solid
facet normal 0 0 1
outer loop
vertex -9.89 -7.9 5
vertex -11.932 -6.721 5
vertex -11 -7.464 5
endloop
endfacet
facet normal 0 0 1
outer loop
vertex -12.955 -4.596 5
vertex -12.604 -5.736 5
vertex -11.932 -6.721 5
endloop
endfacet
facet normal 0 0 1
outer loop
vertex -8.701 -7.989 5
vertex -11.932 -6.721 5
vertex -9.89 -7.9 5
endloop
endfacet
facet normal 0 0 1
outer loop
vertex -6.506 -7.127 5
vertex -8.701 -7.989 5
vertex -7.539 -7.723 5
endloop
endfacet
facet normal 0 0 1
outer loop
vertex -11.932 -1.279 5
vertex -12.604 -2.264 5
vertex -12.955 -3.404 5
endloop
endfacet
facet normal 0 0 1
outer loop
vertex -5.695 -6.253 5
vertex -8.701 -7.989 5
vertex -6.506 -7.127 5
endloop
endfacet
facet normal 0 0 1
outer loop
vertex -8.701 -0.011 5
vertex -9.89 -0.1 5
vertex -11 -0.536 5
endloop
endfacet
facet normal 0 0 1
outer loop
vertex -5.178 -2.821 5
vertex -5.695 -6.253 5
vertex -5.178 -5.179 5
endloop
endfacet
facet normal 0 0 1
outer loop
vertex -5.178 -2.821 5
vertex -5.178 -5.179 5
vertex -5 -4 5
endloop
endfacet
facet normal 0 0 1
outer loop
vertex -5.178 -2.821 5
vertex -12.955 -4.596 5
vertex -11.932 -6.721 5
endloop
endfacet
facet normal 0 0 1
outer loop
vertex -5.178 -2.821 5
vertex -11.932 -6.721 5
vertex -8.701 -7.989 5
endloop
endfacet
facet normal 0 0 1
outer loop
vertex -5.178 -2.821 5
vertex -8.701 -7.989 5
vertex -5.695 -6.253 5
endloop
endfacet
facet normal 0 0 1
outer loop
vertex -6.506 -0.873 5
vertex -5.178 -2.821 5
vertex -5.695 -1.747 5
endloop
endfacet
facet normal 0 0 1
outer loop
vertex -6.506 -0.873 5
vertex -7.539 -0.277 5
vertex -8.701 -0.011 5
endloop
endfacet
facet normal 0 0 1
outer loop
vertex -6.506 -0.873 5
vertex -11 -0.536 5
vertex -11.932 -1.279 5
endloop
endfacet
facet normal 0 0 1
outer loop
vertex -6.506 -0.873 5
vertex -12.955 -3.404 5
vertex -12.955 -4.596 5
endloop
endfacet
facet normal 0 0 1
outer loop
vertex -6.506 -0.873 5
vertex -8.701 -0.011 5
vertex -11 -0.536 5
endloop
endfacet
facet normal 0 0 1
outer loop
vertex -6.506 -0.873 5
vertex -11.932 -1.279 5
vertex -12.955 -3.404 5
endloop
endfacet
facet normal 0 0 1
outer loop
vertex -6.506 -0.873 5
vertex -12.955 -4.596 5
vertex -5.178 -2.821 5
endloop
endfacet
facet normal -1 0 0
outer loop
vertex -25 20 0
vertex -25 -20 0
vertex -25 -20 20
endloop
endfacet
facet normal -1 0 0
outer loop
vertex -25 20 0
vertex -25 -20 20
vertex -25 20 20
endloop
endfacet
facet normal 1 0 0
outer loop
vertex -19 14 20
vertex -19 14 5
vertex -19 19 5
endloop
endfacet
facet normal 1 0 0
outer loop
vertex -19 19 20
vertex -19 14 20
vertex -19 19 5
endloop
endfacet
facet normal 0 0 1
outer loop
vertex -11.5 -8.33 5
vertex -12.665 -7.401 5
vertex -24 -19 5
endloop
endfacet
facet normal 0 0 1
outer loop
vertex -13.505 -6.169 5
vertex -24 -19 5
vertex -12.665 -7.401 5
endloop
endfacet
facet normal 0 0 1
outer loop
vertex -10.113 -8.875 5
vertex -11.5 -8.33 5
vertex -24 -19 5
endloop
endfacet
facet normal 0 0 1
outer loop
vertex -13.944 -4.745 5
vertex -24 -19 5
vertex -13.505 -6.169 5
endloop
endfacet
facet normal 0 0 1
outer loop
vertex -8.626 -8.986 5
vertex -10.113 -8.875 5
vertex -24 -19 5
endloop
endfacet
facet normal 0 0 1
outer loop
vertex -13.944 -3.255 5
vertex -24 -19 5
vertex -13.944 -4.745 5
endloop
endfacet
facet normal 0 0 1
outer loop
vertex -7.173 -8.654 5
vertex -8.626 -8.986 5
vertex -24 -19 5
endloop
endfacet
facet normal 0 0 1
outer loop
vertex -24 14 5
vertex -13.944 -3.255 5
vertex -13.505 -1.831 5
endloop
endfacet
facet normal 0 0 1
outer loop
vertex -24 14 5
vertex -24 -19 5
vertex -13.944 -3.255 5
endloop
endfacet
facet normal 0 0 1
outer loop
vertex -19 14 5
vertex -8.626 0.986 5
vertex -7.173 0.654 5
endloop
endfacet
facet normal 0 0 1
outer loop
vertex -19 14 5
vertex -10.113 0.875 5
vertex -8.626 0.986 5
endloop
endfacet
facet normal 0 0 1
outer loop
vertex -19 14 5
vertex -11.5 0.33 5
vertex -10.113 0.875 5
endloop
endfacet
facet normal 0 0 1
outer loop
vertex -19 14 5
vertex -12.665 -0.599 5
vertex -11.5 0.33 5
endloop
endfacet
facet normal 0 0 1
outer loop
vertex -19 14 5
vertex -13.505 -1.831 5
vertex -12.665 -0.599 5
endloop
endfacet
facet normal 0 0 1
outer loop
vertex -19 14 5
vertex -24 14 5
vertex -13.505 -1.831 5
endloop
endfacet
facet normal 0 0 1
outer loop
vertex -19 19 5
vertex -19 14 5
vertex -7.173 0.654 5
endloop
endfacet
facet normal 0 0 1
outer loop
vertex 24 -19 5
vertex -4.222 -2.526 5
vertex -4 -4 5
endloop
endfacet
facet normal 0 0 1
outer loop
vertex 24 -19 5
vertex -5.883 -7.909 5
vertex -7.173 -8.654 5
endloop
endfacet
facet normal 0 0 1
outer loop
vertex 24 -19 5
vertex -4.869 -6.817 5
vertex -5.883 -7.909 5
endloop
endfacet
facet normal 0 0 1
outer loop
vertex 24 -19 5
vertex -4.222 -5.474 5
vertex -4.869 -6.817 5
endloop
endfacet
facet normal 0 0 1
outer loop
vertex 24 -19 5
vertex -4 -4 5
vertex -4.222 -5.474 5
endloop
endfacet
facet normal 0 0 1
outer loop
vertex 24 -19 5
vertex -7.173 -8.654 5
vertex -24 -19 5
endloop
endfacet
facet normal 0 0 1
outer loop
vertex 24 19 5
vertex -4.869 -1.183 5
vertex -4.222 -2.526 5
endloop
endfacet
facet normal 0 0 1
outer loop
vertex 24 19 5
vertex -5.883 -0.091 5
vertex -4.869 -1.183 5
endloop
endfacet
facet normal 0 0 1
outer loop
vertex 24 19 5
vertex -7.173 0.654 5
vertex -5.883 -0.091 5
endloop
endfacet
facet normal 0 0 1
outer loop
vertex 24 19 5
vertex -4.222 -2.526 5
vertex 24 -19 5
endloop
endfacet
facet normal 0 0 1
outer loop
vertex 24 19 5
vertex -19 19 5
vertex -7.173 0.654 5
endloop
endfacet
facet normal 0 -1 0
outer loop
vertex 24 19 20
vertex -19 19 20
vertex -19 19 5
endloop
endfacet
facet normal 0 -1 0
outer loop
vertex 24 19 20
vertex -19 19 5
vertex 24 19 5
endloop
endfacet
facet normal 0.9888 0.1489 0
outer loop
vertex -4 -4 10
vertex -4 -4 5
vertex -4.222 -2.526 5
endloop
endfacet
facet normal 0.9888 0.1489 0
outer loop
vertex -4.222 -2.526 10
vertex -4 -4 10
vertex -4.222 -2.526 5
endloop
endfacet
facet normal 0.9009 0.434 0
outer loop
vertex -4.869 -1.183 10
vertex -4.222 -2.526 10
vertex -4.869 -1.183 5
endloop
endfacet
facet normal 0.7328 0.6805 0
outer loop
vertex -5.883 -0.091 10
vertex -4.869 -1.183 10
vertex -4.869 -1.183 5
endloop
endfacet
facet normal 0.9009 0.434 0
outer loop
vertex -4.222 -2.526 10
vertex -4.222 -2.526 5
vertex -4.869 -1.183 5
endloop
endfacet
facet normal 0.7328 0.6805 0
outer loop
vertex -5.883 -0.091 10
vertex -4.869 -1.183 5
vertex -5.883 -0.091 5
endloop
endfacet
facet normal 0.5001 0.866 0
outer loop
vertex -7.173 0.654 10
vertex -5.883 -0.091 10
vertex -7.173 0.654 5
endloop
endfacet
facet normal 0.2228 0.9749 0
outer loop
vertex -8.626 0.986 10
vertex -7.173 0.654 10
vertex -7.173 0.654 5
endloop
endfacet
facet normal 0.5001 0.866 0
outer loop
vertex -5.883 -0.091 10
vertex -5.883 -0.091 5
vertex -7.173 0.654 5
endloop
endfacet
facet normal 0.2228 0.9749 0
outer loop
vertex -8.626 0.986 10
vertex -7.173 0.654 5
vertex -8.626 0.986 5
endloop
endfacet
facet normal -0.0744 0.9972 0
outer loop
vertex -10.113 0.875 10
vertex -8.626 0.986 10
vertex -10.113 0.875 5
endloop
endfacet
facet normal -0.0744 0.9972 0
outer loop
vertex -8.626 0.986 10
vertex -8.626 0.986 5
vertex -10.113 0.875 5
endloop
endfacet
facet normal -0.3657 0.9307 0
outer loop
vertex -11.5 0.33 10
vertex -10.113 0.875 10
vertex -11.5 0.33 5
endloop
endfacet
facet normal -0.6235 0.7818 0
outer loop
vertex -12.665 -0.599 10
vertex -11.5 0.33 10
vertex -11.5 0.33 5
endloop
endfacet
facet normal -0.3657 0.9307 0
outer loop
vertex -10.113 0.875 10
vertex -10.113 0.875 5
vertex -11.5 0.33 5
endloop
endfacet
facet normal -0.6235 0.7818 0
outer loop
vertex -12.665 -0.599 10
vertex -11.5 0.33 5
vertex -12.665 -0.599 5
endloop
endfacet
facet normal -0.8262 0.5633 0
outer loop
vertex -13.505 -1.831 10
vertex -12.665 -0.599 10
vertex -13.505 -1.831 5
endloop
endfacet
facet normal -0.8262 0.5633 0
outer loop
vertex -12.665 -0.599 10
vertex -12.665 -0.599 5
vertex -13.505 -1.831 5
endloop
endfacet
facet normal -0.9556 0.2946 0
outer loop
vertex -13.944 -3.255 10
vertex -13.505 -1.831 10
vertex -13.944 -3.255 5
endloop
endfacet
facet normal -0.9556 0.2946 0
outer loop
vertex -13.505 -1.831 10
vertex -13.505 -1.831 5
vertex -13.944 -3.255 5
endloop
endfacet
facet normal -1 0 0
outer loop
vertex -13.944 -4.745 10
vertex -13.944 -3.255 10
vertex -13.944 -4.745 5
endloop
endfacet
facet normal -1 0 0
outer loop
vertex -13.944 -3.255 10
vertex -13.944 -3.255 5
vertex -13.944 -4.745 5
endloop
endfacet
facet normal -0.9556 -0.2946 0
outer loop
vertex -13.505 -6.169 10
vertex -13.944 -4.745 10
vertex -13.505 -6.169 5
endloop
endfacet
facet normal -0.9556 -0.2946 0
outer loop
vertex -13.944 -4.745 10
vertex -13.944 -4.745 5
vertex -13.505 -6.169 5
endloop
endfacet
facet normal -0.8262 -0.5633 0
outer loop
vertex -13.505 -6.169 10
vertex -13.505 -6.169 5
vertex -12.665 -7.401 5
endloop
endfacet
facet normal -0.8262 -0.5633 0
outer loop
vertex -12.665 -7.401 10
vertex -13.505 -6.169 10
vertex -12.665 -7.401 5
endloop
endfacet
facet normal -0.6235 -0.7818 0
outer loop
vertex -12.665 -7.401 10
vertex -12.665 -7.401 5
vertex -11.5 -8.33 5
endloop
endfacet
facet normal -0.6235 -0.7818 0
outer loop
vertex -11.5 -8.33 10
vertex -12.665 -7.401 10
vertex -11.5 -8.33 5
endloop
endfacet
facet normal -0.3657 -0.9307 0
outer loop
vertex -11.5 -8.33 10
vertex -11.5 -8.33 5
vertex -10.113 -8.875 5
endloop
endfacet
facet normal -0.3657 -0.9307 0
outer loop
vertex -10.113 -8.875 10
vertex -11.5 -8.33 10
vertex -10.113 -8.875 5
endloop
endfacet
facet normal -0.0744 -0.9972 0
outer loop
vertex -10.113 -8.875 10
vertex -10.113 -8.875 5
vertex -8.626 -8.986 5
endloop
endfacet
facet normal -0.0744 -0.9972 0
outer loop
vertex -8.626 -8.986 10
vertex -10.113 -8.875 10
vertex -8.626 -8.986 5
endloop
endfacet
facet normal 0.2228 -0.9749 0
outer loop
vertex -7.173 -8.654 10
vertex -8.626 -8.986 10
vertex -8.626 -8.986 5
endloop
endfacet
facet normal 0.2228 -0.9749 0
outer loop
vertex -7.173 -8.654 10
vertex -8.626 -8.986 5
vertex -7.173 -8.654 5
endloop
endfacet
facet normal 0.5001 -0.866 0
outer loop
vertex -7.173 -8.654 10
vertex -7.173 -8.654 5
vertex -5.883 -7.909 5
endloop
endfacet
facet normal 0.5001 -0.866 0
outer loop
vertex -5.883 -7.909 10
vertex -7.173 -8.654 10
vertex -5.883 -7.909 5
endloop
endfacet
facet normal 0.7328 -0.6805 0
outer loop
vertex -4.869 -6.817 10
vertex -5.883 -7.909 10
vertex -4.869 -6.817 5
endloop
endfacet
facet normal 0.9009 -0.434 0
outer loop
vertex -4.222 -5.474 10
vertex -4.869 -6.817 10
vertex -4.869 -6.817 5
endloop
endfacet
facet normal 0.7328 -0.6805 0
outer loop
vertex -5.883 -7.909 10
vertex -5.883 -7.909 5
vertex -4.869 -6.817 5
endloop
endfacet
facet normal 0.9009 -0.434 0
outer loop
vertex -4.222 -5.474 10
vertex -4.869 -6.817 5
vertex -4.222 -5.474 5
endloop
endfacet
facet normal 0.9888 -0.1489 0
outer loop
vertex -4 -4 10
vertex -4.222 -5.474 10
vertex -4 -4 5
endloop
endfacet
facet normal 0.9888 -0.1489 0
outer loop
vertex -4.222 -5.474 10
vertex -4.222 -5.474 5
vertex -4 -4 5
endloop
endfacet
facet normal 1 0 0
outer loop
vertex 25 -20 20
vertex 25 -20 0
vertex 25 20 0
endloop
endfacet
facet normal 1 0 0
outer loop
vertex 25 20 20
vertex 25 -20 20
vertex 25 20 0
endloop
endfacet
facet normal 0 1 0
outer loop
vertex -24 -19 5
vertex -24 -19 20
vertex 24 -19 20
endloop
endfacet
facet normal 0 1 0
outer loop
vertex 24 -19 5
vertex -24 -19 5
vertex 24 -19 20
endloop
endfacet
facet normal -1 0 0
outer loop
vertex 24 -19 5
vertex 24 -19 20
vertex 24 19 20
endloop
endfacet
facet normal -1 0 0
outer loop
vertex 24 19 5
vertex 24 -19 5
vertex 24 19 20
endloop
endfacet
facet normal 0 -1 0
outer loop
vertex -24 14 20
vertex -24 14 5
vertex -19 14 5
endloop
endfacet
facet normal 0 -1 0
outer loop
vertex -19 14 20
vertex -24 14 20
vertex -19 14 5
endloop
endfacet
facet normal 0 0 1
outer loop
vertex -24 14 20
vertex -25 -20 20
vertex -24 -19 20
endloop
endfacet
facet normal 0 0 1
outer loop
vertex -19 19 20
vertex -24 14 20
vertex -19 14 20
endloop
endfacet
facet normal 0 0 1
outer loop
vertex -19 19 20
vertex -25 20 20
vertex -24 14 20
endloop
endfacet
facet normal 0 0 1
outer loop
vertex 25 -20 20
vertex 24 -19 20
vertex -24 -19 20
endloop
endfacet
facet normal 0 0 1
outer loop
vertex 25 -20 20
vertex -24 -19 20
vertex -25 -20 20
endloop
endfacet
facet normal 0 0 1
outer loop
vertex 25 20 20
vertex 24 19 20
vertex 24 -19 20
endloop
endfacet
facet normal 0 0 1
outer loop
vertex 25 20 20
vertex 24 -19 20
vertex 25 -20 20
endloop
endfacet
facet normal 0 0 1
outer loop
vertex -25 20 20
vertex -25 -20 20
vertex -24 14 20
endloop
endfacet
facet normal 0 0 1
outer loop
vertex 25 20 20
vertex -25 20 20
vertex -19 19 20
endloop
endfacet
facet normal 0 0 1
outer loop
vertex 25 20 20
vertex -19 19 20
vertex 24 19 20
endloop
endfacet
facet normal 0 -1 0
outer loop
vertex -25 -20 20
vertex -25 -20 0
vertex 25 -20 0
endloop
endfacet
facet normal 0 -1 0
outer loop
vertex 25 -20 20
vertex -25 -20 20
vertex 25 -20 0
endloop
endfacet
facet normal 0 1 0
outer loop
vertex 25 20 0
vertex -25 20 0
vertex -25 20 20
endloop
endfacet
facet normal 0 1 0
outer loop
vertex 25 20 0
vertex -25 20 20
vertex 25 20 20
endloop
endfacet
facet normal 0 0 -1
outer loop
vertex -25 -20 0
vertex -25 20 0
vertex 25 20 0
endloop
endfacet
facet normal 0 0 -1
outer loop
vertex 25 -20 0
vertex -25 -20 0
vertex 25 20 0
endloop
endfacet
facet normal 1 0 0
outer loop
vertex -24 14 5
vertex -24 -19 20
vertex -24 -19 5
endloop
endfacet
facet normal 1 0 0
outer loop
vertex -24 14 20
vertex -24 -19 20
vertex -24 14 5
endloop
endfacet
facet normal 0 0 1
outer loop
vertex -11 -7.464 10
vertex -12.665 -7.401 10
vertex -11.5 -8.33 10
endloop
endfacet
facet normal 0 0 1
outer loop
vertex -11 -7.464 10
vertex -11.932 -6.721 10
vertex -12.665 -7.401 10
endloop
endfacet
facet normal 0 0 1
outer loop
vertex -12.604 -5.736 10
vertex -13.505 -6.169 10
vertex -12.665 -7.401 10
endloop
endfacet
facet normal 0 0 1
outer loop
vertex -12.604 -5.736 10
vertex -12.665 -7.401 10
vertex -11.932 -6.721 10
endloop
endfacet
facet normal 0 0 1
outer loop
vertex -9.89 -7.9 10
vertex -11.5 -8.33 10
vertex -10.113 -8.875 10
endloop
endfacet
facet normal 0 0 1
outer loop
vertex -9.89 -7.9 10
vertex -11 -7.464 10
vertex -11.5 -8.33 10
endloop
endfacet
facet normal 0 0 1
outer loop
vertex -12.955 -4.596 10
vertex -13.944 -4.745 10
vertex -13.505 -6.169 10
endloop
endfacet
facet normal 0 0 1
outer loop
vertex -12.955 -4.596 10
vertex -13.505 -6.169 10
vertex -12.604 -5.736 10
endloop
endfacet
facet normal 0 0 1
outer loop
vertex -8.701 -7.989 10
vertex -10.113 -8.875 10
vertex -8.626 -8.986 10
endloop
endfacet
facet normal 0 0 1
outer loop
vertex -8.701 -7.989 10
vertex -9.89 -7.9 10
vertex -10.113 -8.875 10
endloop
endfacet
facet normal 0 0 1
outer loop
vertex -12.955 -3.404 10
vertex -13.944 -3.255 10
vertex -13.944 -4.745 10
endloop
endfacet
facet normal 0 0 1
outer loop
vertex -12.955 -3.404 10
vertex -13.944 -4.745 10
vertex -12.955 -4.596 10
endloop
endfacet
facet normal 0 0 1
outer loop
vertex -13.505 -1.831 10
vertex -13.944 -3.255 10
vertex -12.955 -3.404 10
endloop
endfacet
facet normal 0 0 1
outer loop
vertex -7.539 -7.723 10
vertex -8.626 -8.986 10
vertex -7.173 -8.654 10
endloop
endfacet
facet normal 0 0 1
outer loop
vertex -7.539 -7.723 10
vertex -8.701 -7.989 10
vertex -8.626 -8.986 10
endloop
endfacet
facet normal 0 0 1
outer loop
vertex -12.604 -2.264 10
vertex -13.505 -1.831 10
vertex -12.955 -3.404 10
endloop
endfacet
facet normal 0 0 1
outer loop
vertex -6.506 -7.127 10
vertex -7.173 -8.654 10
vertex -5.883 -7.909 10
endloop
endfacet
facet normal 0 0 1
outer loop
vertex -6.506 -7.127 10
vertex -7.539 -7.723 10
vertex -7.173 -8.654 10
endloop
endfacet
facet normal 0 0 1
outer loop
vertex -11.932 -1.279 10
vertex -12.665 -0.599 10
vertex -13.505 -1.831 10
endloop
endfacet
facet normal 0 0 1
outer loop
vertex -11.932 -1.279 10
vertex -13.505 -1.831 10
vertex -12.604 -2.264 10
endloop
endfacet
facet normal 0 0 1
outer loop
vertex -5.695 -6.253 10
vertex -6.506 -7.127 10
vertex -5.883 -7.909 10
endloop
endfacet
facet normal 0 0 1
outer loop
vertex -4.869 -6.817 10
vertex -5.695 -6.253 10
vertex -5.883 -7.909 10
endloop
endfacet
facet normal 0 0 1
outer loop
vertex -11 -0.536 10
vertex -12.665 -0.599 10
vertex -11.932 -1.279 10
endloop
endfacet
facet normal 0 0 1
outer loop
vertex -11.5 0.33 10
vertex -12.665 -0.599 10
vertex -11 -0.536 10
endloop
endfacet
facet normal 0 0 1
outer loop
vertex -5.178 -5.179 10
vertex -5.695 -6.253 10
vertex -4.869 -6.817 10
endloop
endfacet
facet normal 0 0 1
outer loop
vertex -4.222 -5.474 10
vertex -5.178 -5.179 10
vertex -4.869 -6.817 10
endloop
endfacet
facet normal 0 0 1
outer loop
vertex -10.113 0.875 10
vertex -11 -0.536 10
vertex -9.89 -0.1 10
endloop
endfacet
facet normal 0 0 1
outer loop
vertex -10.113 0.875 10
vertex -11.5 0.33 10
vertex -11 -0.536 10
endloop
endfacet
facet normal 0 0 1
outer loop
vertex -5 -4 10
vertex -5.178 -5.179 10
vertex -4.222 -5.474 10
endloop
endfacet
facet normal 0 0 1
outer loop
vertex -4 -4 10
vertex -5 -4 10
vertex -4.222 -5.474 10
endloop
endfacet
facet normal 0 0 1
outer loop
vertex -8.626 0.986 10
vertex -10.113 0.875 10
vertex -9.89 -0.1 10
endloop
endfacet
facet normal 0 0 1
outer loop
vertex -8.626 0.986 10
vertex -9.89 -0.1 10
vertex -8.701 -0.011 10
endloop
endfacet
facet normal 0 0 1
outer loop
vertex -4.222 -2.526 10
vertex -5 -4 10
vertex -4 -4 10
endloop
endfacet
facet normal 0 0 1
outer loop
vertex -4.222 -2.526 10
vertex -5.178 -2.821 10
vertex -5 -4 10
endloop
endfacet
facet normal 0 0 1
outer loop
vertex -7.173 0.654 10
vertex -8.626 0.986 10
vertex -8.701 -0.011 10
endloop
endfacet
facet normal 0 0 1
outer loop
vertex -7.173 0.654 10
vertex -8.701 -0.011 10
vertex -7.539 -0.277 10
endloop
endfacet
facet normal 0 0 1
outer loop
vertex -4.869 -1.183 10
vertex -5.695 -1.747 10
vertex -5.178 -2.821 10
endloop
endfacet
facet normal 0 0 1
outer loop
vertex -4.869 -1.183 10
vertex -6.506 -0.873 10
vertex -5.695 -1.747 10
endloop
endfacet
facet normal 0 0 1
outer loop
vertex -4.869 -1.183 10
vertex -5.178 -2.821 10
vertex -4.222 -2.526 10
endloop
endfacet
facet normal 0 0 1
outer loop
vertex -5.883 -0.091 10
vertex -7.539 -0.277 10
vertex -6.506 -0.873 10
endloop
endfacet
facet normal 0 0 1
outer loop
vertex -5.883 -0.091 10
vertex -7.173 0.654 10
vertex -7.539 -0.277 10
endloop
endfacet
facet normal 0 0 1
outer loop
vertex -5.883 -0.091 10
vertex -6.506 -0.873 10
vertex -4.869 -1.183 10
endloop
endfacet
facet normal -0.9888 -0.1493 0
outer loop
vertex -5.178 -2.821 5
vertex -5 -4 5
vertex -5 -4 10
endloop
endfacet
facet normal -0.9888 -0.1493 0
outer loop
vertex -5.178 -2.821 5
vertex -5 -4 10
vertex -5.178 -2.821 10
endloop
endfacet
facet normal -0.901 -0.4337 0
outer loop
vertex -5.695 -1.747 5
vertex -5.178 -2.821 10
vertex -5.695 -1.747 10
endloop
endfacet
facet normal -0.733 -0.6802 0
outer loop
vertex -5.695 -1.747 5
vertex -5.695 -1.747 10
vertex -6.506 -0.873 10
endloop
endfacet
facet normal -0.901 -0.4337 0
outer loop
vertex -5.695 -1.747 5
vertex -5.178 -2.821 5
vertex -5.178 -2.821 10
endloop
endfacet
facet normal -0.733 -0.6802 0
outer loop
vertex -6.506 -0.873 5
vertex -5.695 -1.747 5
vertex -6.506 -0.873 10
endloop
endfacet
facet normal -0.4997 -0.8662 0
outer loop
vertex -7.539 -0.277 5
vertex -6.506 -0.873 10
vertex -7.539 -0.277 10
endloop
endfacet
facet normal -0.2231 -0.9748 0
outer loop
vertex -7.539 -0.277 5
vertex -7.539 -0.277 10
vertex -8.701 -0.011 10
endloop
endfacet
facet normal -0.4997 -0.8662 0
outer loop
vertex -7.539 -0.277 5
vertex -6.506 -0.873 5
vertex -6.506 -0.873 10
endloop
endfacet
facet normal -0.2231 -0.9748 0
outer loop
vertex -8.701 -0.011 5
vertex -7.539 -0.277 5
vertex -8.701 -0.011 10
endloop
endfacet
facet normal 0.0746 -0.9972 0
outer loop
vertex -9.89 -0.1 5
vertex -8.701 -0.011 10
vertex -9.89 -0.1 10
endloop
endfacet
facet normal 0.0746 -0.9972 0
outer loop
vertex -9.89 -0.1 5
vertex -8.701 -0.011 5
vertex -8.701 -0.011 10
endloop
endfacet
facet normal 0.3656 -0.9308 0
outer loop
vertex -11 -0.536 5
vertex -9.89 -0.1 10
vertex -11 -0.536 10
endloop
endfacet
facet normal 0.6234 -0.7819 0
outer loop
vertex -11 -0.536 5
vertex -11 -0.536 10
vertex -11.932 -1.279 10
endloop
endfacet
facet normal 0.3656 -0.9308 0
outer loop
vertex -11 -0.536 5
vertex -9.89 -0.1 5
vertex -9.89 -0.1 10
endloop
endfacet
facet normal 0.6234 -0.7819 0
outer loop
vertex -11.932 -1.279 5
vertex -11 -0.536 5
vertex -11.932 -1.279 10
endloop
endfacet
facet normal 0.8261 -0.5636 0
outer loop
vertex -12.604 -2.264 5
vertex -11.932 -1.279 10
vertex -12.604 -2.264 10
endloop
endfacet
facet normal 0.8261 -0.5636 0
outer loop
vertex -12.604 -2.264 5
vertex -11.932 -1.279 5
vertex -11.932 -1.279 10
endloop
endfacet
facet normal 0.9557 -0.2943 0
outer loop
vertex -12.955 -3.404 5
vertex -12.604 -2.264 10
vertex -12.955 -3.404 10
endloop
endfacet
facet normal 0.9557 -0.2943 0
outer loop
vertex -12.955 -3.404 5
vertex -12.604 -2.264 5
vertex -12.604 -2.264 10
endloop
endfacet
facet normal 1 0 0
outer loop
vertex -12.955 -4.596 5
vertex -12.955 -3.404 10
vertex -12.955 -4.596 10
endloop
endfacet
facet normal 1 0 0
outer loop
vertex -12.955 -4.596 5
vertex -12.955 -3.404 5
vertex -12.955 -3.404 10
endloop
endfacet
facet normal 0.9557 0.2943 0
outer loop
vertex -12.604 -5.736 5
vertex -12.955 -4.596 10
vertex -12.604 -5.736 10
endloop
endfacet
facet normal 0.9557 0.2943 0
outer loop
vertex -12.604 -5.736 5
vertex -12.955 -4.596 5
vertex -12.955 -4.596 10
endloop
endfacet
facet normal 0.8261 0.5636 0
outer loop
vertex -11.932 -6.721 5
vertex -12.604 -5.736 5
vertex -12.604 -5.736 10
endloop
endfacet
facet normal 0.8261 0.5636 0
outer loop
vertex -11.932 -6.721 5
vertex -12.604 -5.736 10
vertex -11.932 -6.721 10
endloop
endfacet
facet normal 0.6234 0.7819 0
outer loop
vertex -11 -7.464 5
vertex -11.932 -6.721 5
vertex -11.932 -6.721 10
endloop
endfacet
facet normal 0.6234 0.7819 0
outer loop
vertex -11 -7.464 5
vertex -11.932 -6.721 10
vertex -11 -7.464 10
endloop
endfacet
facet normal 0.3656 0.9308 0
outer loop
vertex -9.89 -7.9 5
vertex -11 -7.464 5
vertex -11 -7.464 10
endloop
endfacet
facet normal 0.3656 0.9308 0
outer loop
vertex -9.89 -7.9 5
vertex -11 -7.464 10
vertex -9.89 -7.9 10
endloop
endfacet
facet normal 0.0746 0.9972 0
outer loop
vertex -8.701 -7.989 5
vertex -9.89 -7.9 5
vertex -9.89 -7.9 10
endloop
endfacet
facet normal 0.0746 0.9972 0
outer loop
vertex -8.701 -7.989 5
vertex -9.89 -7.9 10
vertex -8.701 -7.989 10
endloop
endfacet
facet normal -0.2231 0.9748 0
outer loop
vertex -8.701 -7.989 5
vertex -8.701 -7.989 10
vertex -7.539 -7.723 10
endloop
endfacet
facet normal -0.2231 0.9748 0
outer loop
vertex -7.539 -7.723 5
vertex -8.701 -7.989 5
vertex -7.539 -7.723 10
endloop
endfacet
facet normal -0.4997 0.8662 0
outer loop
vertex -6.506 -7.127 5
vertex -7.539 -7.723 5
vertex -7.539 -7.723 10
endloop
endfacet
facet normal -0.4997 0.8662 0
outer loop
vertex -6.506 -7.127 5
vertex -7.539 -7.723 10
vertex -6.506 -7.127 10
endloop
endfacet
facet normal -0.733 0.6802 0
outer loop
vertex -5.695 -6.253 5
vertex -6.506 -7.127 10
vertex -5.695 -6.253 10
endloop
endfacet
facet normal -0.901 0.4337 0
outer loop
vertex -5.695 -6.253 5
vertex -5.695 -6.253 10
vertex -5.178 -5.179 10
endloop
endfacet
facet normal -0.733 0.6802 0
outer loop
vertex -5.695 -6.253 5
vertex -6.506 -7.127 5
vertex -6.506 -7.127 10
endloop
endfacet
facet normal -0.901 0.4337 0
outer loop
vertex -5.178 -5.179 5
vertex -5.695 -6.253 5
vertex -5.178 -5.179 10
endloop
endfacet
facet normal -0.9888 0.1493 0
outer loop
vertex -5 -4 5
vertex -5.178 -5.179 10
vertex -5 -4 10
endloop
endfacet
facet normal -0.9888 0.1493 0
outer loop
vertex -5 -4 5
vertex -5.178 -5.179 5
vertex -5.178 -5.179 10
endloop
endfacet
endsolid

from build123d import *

# Parameters (mm, degrees)
F0_W     = 50
F0_H     = 40
F1_DEPTH = 20
F2_W     = 48
F2_H     = 38
F3_DEPTH = 15
F4_W     = 5
F4_H     = 5
F5_DEPTH = 15
F6_R     = 5
F6_R_2   = 4
F7_DEPTH = 5


with BuildPart() as f1:
    # F0 (on Top) → F1 (new body)
    with BuildSketch(Plane.XY):
        Rectangle(F0_W, F0_H)
    extrude(amount=F1_DEPTH)

    # F2 (on face) → F3 (cut)
    with BuildSketch(Plane.XY.offset(20)):
        Rectangle(F2_W, F2_H)
    extrude(amount=-F3_DEPTH, mode=Mode.SUBTRACT)

    # F4 (on face) → F5 (join)
    with BuildSketch(Plane.XY.offset(5)):
        with Locations((-21.5, 16.5)):
            Rectangle(F4_W, F4_H)
    extrude(amount=F5_DEPTH)

    # F6 (on face) → F7 (join)
    with BuildSketch(Plane.XY.offset(5)):
        with Locations((-9, -4)):
            Circle(F6_R)
        with Locations((-9, -4)):
            Circle(F6_R_2, mode=Mode.SUBTRACT)
    extrude(amount=F7_DEPTH)


solid = f1.part
